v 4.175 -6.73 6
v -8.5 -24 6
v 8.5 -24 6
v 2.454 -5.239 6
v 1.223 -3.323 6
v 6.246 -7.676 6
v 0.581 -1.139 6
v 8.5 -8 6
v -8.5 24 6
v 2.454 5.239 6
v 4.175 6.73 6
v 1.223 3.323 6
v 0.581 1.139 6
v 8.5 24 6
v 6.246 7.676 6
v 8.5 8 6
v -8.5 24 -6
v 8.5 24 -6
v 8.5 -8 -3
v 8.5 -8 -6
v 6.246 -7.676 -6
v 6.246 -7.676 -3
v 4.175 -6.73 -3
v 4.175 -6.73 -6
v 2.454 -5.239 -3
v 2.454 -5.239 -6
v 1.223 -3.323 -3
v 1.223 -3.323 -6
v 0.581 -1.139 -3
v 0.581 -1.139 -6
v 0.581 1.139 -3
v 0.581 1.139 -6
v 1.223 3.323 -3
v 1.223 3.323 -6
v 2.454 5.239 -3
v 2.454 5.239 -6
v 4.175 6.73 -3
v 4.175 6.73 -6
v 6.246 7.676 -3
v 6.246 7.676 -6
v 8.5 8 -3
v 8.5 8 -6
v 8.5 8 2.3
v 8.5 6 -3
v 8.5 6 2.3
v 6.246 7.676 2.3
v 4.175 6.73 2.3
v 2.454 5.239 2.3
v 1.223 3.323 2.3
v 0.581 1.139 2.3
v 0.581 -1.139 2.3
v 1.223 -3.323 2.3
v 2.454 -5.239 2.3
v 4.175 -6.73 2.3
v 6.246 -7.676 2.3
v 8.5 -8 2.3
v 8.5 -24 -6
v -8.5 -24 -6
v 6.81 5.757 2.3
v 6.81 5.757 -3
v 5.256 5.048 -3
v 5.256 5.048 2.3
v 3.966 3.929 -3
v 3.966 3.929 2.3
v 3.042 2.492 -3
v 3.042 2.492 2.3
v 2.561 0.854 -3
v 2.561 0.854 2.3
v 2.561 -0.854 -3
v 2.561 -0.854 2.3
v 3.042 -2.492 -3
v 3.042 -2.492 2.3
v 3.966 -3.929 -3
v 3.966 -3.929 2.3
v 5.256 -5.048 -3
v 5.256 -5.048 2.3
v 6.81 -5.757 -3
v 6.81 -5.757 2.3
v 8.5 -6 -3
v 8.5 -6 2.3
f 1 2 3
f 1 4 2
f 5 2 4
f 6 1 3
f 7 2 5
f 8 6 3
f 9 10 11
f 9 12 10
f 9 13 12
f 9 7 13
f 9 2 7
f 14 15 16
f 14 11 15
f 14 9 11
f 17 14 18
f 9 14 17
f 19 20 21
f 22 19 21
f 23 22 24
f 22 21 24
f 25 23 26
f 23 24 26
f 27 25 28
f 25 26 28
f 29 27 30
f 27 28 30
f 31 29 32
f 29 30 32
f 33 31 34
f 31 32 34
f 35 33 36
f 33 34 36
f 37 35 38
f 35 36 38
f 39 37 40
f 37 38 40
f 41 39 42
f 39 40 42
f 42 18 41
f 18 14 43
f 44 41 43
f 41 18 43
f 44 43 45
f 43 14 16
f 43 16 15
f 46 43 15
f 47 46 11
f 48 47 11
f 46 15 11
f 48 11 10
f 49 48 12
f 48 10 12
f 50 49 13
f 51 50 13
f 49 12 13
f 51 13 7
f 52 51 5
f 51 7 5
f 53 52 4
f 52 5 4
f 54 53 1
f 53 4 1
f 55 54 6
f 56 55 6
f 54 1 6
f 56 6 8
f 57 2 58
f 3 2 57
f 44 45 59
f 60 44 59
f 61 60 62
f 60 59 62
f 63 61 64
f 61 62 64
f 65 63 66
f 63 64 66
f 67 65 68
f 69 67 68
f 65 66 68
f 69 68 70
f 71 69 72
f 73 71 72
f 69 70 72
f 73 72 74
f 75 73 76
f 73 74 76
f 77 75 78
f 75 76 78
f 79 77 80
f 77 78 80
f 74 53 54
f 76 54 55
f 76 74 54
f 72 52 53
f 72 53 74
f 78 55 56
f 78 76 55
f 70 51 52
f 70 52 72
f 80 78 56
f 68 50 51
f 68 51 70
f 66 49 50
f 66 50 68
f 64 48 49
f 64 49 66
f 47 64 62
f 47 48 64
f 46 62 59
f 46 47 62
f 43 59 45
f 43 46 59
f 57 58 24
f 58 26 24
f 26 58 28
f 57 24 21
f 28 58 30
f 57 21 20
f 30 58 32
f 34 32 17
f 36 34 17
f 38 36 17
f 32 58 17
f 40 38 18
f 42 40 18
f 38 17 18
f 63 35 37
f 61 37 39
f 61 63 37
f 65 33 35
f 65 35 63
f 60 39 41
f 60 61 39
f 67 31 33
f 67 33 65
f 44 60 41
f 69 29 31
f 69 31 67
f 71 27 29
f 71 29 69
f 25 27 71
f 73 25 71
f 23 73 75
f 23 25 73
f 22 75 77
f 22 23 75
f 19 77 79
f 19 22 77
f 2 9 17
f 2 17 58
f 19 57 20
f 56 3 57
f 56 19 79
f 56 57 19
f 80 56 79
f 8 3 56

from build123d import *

# Parameters (mm, degrees)
PAD_DEPTH       = 6
POCKET_DEPTH    = 3.7
POCKET001_DEPTH = 3


with BuildPart() as part:
    # Sketch → Pad (new body, symmetric)
    with BuildSketch(Plane.XY):
        with BuildLine():
            Line((8.5, 24), (-8.5, 24))
            Line((-8.5, 24), (-8.5, -24))
            Line((-8.5, -24), (8.500003, -24))
            Line((8.500003, -24), (8.500003, -6))
            ThreePointArc((8.5, 6), (2.500003, -1e-06), (8.500003, -6))
            Line((8.5, 24), (8.5, 6))
        make_face()
    extrude(amount=PAD_DEPTH, both=True)

    # Sketch001 → Pocket (cut)
    with BuildSketch(Plane.XY.offset(6)):
        with BuildLine():
            ThreePointArc((8.5, 8), (0.499974, 1.3e-05), (8.499974, -8))
            Line((24.499948, -8), (8.499974, -8))
            Line((24.499948, 7.999948), (24.499948, -8))
            Line((8.5, 8), (24.499948, 7.999948))
        make_face()
    extrude(amount=-POCKET_DEPTH, mode=Mode.SUBTRACT)

    # Sketch002 → Pocket001 (cut)
    with BuildSketch(Plane(origin=(0, 0, -6), x_dir=(1, 0, 0), z_dir=(0, 0, -1))):
        with BuildLine():
            ThreePointArc((8.5, 8), (0.499986, 7e-06), (8.499985, -8))
            Line((24.499971, -8), (8.499985, -8))
            Line((24.499971, 7.999971), (24.499971, -8))
            Line((8.5, 8), (24.499971, 7.999971))
        make_face()
    extrude(amount=-POCKET001_DEPTH, mode=Mode.SUBTRACT)


solid = part.part
